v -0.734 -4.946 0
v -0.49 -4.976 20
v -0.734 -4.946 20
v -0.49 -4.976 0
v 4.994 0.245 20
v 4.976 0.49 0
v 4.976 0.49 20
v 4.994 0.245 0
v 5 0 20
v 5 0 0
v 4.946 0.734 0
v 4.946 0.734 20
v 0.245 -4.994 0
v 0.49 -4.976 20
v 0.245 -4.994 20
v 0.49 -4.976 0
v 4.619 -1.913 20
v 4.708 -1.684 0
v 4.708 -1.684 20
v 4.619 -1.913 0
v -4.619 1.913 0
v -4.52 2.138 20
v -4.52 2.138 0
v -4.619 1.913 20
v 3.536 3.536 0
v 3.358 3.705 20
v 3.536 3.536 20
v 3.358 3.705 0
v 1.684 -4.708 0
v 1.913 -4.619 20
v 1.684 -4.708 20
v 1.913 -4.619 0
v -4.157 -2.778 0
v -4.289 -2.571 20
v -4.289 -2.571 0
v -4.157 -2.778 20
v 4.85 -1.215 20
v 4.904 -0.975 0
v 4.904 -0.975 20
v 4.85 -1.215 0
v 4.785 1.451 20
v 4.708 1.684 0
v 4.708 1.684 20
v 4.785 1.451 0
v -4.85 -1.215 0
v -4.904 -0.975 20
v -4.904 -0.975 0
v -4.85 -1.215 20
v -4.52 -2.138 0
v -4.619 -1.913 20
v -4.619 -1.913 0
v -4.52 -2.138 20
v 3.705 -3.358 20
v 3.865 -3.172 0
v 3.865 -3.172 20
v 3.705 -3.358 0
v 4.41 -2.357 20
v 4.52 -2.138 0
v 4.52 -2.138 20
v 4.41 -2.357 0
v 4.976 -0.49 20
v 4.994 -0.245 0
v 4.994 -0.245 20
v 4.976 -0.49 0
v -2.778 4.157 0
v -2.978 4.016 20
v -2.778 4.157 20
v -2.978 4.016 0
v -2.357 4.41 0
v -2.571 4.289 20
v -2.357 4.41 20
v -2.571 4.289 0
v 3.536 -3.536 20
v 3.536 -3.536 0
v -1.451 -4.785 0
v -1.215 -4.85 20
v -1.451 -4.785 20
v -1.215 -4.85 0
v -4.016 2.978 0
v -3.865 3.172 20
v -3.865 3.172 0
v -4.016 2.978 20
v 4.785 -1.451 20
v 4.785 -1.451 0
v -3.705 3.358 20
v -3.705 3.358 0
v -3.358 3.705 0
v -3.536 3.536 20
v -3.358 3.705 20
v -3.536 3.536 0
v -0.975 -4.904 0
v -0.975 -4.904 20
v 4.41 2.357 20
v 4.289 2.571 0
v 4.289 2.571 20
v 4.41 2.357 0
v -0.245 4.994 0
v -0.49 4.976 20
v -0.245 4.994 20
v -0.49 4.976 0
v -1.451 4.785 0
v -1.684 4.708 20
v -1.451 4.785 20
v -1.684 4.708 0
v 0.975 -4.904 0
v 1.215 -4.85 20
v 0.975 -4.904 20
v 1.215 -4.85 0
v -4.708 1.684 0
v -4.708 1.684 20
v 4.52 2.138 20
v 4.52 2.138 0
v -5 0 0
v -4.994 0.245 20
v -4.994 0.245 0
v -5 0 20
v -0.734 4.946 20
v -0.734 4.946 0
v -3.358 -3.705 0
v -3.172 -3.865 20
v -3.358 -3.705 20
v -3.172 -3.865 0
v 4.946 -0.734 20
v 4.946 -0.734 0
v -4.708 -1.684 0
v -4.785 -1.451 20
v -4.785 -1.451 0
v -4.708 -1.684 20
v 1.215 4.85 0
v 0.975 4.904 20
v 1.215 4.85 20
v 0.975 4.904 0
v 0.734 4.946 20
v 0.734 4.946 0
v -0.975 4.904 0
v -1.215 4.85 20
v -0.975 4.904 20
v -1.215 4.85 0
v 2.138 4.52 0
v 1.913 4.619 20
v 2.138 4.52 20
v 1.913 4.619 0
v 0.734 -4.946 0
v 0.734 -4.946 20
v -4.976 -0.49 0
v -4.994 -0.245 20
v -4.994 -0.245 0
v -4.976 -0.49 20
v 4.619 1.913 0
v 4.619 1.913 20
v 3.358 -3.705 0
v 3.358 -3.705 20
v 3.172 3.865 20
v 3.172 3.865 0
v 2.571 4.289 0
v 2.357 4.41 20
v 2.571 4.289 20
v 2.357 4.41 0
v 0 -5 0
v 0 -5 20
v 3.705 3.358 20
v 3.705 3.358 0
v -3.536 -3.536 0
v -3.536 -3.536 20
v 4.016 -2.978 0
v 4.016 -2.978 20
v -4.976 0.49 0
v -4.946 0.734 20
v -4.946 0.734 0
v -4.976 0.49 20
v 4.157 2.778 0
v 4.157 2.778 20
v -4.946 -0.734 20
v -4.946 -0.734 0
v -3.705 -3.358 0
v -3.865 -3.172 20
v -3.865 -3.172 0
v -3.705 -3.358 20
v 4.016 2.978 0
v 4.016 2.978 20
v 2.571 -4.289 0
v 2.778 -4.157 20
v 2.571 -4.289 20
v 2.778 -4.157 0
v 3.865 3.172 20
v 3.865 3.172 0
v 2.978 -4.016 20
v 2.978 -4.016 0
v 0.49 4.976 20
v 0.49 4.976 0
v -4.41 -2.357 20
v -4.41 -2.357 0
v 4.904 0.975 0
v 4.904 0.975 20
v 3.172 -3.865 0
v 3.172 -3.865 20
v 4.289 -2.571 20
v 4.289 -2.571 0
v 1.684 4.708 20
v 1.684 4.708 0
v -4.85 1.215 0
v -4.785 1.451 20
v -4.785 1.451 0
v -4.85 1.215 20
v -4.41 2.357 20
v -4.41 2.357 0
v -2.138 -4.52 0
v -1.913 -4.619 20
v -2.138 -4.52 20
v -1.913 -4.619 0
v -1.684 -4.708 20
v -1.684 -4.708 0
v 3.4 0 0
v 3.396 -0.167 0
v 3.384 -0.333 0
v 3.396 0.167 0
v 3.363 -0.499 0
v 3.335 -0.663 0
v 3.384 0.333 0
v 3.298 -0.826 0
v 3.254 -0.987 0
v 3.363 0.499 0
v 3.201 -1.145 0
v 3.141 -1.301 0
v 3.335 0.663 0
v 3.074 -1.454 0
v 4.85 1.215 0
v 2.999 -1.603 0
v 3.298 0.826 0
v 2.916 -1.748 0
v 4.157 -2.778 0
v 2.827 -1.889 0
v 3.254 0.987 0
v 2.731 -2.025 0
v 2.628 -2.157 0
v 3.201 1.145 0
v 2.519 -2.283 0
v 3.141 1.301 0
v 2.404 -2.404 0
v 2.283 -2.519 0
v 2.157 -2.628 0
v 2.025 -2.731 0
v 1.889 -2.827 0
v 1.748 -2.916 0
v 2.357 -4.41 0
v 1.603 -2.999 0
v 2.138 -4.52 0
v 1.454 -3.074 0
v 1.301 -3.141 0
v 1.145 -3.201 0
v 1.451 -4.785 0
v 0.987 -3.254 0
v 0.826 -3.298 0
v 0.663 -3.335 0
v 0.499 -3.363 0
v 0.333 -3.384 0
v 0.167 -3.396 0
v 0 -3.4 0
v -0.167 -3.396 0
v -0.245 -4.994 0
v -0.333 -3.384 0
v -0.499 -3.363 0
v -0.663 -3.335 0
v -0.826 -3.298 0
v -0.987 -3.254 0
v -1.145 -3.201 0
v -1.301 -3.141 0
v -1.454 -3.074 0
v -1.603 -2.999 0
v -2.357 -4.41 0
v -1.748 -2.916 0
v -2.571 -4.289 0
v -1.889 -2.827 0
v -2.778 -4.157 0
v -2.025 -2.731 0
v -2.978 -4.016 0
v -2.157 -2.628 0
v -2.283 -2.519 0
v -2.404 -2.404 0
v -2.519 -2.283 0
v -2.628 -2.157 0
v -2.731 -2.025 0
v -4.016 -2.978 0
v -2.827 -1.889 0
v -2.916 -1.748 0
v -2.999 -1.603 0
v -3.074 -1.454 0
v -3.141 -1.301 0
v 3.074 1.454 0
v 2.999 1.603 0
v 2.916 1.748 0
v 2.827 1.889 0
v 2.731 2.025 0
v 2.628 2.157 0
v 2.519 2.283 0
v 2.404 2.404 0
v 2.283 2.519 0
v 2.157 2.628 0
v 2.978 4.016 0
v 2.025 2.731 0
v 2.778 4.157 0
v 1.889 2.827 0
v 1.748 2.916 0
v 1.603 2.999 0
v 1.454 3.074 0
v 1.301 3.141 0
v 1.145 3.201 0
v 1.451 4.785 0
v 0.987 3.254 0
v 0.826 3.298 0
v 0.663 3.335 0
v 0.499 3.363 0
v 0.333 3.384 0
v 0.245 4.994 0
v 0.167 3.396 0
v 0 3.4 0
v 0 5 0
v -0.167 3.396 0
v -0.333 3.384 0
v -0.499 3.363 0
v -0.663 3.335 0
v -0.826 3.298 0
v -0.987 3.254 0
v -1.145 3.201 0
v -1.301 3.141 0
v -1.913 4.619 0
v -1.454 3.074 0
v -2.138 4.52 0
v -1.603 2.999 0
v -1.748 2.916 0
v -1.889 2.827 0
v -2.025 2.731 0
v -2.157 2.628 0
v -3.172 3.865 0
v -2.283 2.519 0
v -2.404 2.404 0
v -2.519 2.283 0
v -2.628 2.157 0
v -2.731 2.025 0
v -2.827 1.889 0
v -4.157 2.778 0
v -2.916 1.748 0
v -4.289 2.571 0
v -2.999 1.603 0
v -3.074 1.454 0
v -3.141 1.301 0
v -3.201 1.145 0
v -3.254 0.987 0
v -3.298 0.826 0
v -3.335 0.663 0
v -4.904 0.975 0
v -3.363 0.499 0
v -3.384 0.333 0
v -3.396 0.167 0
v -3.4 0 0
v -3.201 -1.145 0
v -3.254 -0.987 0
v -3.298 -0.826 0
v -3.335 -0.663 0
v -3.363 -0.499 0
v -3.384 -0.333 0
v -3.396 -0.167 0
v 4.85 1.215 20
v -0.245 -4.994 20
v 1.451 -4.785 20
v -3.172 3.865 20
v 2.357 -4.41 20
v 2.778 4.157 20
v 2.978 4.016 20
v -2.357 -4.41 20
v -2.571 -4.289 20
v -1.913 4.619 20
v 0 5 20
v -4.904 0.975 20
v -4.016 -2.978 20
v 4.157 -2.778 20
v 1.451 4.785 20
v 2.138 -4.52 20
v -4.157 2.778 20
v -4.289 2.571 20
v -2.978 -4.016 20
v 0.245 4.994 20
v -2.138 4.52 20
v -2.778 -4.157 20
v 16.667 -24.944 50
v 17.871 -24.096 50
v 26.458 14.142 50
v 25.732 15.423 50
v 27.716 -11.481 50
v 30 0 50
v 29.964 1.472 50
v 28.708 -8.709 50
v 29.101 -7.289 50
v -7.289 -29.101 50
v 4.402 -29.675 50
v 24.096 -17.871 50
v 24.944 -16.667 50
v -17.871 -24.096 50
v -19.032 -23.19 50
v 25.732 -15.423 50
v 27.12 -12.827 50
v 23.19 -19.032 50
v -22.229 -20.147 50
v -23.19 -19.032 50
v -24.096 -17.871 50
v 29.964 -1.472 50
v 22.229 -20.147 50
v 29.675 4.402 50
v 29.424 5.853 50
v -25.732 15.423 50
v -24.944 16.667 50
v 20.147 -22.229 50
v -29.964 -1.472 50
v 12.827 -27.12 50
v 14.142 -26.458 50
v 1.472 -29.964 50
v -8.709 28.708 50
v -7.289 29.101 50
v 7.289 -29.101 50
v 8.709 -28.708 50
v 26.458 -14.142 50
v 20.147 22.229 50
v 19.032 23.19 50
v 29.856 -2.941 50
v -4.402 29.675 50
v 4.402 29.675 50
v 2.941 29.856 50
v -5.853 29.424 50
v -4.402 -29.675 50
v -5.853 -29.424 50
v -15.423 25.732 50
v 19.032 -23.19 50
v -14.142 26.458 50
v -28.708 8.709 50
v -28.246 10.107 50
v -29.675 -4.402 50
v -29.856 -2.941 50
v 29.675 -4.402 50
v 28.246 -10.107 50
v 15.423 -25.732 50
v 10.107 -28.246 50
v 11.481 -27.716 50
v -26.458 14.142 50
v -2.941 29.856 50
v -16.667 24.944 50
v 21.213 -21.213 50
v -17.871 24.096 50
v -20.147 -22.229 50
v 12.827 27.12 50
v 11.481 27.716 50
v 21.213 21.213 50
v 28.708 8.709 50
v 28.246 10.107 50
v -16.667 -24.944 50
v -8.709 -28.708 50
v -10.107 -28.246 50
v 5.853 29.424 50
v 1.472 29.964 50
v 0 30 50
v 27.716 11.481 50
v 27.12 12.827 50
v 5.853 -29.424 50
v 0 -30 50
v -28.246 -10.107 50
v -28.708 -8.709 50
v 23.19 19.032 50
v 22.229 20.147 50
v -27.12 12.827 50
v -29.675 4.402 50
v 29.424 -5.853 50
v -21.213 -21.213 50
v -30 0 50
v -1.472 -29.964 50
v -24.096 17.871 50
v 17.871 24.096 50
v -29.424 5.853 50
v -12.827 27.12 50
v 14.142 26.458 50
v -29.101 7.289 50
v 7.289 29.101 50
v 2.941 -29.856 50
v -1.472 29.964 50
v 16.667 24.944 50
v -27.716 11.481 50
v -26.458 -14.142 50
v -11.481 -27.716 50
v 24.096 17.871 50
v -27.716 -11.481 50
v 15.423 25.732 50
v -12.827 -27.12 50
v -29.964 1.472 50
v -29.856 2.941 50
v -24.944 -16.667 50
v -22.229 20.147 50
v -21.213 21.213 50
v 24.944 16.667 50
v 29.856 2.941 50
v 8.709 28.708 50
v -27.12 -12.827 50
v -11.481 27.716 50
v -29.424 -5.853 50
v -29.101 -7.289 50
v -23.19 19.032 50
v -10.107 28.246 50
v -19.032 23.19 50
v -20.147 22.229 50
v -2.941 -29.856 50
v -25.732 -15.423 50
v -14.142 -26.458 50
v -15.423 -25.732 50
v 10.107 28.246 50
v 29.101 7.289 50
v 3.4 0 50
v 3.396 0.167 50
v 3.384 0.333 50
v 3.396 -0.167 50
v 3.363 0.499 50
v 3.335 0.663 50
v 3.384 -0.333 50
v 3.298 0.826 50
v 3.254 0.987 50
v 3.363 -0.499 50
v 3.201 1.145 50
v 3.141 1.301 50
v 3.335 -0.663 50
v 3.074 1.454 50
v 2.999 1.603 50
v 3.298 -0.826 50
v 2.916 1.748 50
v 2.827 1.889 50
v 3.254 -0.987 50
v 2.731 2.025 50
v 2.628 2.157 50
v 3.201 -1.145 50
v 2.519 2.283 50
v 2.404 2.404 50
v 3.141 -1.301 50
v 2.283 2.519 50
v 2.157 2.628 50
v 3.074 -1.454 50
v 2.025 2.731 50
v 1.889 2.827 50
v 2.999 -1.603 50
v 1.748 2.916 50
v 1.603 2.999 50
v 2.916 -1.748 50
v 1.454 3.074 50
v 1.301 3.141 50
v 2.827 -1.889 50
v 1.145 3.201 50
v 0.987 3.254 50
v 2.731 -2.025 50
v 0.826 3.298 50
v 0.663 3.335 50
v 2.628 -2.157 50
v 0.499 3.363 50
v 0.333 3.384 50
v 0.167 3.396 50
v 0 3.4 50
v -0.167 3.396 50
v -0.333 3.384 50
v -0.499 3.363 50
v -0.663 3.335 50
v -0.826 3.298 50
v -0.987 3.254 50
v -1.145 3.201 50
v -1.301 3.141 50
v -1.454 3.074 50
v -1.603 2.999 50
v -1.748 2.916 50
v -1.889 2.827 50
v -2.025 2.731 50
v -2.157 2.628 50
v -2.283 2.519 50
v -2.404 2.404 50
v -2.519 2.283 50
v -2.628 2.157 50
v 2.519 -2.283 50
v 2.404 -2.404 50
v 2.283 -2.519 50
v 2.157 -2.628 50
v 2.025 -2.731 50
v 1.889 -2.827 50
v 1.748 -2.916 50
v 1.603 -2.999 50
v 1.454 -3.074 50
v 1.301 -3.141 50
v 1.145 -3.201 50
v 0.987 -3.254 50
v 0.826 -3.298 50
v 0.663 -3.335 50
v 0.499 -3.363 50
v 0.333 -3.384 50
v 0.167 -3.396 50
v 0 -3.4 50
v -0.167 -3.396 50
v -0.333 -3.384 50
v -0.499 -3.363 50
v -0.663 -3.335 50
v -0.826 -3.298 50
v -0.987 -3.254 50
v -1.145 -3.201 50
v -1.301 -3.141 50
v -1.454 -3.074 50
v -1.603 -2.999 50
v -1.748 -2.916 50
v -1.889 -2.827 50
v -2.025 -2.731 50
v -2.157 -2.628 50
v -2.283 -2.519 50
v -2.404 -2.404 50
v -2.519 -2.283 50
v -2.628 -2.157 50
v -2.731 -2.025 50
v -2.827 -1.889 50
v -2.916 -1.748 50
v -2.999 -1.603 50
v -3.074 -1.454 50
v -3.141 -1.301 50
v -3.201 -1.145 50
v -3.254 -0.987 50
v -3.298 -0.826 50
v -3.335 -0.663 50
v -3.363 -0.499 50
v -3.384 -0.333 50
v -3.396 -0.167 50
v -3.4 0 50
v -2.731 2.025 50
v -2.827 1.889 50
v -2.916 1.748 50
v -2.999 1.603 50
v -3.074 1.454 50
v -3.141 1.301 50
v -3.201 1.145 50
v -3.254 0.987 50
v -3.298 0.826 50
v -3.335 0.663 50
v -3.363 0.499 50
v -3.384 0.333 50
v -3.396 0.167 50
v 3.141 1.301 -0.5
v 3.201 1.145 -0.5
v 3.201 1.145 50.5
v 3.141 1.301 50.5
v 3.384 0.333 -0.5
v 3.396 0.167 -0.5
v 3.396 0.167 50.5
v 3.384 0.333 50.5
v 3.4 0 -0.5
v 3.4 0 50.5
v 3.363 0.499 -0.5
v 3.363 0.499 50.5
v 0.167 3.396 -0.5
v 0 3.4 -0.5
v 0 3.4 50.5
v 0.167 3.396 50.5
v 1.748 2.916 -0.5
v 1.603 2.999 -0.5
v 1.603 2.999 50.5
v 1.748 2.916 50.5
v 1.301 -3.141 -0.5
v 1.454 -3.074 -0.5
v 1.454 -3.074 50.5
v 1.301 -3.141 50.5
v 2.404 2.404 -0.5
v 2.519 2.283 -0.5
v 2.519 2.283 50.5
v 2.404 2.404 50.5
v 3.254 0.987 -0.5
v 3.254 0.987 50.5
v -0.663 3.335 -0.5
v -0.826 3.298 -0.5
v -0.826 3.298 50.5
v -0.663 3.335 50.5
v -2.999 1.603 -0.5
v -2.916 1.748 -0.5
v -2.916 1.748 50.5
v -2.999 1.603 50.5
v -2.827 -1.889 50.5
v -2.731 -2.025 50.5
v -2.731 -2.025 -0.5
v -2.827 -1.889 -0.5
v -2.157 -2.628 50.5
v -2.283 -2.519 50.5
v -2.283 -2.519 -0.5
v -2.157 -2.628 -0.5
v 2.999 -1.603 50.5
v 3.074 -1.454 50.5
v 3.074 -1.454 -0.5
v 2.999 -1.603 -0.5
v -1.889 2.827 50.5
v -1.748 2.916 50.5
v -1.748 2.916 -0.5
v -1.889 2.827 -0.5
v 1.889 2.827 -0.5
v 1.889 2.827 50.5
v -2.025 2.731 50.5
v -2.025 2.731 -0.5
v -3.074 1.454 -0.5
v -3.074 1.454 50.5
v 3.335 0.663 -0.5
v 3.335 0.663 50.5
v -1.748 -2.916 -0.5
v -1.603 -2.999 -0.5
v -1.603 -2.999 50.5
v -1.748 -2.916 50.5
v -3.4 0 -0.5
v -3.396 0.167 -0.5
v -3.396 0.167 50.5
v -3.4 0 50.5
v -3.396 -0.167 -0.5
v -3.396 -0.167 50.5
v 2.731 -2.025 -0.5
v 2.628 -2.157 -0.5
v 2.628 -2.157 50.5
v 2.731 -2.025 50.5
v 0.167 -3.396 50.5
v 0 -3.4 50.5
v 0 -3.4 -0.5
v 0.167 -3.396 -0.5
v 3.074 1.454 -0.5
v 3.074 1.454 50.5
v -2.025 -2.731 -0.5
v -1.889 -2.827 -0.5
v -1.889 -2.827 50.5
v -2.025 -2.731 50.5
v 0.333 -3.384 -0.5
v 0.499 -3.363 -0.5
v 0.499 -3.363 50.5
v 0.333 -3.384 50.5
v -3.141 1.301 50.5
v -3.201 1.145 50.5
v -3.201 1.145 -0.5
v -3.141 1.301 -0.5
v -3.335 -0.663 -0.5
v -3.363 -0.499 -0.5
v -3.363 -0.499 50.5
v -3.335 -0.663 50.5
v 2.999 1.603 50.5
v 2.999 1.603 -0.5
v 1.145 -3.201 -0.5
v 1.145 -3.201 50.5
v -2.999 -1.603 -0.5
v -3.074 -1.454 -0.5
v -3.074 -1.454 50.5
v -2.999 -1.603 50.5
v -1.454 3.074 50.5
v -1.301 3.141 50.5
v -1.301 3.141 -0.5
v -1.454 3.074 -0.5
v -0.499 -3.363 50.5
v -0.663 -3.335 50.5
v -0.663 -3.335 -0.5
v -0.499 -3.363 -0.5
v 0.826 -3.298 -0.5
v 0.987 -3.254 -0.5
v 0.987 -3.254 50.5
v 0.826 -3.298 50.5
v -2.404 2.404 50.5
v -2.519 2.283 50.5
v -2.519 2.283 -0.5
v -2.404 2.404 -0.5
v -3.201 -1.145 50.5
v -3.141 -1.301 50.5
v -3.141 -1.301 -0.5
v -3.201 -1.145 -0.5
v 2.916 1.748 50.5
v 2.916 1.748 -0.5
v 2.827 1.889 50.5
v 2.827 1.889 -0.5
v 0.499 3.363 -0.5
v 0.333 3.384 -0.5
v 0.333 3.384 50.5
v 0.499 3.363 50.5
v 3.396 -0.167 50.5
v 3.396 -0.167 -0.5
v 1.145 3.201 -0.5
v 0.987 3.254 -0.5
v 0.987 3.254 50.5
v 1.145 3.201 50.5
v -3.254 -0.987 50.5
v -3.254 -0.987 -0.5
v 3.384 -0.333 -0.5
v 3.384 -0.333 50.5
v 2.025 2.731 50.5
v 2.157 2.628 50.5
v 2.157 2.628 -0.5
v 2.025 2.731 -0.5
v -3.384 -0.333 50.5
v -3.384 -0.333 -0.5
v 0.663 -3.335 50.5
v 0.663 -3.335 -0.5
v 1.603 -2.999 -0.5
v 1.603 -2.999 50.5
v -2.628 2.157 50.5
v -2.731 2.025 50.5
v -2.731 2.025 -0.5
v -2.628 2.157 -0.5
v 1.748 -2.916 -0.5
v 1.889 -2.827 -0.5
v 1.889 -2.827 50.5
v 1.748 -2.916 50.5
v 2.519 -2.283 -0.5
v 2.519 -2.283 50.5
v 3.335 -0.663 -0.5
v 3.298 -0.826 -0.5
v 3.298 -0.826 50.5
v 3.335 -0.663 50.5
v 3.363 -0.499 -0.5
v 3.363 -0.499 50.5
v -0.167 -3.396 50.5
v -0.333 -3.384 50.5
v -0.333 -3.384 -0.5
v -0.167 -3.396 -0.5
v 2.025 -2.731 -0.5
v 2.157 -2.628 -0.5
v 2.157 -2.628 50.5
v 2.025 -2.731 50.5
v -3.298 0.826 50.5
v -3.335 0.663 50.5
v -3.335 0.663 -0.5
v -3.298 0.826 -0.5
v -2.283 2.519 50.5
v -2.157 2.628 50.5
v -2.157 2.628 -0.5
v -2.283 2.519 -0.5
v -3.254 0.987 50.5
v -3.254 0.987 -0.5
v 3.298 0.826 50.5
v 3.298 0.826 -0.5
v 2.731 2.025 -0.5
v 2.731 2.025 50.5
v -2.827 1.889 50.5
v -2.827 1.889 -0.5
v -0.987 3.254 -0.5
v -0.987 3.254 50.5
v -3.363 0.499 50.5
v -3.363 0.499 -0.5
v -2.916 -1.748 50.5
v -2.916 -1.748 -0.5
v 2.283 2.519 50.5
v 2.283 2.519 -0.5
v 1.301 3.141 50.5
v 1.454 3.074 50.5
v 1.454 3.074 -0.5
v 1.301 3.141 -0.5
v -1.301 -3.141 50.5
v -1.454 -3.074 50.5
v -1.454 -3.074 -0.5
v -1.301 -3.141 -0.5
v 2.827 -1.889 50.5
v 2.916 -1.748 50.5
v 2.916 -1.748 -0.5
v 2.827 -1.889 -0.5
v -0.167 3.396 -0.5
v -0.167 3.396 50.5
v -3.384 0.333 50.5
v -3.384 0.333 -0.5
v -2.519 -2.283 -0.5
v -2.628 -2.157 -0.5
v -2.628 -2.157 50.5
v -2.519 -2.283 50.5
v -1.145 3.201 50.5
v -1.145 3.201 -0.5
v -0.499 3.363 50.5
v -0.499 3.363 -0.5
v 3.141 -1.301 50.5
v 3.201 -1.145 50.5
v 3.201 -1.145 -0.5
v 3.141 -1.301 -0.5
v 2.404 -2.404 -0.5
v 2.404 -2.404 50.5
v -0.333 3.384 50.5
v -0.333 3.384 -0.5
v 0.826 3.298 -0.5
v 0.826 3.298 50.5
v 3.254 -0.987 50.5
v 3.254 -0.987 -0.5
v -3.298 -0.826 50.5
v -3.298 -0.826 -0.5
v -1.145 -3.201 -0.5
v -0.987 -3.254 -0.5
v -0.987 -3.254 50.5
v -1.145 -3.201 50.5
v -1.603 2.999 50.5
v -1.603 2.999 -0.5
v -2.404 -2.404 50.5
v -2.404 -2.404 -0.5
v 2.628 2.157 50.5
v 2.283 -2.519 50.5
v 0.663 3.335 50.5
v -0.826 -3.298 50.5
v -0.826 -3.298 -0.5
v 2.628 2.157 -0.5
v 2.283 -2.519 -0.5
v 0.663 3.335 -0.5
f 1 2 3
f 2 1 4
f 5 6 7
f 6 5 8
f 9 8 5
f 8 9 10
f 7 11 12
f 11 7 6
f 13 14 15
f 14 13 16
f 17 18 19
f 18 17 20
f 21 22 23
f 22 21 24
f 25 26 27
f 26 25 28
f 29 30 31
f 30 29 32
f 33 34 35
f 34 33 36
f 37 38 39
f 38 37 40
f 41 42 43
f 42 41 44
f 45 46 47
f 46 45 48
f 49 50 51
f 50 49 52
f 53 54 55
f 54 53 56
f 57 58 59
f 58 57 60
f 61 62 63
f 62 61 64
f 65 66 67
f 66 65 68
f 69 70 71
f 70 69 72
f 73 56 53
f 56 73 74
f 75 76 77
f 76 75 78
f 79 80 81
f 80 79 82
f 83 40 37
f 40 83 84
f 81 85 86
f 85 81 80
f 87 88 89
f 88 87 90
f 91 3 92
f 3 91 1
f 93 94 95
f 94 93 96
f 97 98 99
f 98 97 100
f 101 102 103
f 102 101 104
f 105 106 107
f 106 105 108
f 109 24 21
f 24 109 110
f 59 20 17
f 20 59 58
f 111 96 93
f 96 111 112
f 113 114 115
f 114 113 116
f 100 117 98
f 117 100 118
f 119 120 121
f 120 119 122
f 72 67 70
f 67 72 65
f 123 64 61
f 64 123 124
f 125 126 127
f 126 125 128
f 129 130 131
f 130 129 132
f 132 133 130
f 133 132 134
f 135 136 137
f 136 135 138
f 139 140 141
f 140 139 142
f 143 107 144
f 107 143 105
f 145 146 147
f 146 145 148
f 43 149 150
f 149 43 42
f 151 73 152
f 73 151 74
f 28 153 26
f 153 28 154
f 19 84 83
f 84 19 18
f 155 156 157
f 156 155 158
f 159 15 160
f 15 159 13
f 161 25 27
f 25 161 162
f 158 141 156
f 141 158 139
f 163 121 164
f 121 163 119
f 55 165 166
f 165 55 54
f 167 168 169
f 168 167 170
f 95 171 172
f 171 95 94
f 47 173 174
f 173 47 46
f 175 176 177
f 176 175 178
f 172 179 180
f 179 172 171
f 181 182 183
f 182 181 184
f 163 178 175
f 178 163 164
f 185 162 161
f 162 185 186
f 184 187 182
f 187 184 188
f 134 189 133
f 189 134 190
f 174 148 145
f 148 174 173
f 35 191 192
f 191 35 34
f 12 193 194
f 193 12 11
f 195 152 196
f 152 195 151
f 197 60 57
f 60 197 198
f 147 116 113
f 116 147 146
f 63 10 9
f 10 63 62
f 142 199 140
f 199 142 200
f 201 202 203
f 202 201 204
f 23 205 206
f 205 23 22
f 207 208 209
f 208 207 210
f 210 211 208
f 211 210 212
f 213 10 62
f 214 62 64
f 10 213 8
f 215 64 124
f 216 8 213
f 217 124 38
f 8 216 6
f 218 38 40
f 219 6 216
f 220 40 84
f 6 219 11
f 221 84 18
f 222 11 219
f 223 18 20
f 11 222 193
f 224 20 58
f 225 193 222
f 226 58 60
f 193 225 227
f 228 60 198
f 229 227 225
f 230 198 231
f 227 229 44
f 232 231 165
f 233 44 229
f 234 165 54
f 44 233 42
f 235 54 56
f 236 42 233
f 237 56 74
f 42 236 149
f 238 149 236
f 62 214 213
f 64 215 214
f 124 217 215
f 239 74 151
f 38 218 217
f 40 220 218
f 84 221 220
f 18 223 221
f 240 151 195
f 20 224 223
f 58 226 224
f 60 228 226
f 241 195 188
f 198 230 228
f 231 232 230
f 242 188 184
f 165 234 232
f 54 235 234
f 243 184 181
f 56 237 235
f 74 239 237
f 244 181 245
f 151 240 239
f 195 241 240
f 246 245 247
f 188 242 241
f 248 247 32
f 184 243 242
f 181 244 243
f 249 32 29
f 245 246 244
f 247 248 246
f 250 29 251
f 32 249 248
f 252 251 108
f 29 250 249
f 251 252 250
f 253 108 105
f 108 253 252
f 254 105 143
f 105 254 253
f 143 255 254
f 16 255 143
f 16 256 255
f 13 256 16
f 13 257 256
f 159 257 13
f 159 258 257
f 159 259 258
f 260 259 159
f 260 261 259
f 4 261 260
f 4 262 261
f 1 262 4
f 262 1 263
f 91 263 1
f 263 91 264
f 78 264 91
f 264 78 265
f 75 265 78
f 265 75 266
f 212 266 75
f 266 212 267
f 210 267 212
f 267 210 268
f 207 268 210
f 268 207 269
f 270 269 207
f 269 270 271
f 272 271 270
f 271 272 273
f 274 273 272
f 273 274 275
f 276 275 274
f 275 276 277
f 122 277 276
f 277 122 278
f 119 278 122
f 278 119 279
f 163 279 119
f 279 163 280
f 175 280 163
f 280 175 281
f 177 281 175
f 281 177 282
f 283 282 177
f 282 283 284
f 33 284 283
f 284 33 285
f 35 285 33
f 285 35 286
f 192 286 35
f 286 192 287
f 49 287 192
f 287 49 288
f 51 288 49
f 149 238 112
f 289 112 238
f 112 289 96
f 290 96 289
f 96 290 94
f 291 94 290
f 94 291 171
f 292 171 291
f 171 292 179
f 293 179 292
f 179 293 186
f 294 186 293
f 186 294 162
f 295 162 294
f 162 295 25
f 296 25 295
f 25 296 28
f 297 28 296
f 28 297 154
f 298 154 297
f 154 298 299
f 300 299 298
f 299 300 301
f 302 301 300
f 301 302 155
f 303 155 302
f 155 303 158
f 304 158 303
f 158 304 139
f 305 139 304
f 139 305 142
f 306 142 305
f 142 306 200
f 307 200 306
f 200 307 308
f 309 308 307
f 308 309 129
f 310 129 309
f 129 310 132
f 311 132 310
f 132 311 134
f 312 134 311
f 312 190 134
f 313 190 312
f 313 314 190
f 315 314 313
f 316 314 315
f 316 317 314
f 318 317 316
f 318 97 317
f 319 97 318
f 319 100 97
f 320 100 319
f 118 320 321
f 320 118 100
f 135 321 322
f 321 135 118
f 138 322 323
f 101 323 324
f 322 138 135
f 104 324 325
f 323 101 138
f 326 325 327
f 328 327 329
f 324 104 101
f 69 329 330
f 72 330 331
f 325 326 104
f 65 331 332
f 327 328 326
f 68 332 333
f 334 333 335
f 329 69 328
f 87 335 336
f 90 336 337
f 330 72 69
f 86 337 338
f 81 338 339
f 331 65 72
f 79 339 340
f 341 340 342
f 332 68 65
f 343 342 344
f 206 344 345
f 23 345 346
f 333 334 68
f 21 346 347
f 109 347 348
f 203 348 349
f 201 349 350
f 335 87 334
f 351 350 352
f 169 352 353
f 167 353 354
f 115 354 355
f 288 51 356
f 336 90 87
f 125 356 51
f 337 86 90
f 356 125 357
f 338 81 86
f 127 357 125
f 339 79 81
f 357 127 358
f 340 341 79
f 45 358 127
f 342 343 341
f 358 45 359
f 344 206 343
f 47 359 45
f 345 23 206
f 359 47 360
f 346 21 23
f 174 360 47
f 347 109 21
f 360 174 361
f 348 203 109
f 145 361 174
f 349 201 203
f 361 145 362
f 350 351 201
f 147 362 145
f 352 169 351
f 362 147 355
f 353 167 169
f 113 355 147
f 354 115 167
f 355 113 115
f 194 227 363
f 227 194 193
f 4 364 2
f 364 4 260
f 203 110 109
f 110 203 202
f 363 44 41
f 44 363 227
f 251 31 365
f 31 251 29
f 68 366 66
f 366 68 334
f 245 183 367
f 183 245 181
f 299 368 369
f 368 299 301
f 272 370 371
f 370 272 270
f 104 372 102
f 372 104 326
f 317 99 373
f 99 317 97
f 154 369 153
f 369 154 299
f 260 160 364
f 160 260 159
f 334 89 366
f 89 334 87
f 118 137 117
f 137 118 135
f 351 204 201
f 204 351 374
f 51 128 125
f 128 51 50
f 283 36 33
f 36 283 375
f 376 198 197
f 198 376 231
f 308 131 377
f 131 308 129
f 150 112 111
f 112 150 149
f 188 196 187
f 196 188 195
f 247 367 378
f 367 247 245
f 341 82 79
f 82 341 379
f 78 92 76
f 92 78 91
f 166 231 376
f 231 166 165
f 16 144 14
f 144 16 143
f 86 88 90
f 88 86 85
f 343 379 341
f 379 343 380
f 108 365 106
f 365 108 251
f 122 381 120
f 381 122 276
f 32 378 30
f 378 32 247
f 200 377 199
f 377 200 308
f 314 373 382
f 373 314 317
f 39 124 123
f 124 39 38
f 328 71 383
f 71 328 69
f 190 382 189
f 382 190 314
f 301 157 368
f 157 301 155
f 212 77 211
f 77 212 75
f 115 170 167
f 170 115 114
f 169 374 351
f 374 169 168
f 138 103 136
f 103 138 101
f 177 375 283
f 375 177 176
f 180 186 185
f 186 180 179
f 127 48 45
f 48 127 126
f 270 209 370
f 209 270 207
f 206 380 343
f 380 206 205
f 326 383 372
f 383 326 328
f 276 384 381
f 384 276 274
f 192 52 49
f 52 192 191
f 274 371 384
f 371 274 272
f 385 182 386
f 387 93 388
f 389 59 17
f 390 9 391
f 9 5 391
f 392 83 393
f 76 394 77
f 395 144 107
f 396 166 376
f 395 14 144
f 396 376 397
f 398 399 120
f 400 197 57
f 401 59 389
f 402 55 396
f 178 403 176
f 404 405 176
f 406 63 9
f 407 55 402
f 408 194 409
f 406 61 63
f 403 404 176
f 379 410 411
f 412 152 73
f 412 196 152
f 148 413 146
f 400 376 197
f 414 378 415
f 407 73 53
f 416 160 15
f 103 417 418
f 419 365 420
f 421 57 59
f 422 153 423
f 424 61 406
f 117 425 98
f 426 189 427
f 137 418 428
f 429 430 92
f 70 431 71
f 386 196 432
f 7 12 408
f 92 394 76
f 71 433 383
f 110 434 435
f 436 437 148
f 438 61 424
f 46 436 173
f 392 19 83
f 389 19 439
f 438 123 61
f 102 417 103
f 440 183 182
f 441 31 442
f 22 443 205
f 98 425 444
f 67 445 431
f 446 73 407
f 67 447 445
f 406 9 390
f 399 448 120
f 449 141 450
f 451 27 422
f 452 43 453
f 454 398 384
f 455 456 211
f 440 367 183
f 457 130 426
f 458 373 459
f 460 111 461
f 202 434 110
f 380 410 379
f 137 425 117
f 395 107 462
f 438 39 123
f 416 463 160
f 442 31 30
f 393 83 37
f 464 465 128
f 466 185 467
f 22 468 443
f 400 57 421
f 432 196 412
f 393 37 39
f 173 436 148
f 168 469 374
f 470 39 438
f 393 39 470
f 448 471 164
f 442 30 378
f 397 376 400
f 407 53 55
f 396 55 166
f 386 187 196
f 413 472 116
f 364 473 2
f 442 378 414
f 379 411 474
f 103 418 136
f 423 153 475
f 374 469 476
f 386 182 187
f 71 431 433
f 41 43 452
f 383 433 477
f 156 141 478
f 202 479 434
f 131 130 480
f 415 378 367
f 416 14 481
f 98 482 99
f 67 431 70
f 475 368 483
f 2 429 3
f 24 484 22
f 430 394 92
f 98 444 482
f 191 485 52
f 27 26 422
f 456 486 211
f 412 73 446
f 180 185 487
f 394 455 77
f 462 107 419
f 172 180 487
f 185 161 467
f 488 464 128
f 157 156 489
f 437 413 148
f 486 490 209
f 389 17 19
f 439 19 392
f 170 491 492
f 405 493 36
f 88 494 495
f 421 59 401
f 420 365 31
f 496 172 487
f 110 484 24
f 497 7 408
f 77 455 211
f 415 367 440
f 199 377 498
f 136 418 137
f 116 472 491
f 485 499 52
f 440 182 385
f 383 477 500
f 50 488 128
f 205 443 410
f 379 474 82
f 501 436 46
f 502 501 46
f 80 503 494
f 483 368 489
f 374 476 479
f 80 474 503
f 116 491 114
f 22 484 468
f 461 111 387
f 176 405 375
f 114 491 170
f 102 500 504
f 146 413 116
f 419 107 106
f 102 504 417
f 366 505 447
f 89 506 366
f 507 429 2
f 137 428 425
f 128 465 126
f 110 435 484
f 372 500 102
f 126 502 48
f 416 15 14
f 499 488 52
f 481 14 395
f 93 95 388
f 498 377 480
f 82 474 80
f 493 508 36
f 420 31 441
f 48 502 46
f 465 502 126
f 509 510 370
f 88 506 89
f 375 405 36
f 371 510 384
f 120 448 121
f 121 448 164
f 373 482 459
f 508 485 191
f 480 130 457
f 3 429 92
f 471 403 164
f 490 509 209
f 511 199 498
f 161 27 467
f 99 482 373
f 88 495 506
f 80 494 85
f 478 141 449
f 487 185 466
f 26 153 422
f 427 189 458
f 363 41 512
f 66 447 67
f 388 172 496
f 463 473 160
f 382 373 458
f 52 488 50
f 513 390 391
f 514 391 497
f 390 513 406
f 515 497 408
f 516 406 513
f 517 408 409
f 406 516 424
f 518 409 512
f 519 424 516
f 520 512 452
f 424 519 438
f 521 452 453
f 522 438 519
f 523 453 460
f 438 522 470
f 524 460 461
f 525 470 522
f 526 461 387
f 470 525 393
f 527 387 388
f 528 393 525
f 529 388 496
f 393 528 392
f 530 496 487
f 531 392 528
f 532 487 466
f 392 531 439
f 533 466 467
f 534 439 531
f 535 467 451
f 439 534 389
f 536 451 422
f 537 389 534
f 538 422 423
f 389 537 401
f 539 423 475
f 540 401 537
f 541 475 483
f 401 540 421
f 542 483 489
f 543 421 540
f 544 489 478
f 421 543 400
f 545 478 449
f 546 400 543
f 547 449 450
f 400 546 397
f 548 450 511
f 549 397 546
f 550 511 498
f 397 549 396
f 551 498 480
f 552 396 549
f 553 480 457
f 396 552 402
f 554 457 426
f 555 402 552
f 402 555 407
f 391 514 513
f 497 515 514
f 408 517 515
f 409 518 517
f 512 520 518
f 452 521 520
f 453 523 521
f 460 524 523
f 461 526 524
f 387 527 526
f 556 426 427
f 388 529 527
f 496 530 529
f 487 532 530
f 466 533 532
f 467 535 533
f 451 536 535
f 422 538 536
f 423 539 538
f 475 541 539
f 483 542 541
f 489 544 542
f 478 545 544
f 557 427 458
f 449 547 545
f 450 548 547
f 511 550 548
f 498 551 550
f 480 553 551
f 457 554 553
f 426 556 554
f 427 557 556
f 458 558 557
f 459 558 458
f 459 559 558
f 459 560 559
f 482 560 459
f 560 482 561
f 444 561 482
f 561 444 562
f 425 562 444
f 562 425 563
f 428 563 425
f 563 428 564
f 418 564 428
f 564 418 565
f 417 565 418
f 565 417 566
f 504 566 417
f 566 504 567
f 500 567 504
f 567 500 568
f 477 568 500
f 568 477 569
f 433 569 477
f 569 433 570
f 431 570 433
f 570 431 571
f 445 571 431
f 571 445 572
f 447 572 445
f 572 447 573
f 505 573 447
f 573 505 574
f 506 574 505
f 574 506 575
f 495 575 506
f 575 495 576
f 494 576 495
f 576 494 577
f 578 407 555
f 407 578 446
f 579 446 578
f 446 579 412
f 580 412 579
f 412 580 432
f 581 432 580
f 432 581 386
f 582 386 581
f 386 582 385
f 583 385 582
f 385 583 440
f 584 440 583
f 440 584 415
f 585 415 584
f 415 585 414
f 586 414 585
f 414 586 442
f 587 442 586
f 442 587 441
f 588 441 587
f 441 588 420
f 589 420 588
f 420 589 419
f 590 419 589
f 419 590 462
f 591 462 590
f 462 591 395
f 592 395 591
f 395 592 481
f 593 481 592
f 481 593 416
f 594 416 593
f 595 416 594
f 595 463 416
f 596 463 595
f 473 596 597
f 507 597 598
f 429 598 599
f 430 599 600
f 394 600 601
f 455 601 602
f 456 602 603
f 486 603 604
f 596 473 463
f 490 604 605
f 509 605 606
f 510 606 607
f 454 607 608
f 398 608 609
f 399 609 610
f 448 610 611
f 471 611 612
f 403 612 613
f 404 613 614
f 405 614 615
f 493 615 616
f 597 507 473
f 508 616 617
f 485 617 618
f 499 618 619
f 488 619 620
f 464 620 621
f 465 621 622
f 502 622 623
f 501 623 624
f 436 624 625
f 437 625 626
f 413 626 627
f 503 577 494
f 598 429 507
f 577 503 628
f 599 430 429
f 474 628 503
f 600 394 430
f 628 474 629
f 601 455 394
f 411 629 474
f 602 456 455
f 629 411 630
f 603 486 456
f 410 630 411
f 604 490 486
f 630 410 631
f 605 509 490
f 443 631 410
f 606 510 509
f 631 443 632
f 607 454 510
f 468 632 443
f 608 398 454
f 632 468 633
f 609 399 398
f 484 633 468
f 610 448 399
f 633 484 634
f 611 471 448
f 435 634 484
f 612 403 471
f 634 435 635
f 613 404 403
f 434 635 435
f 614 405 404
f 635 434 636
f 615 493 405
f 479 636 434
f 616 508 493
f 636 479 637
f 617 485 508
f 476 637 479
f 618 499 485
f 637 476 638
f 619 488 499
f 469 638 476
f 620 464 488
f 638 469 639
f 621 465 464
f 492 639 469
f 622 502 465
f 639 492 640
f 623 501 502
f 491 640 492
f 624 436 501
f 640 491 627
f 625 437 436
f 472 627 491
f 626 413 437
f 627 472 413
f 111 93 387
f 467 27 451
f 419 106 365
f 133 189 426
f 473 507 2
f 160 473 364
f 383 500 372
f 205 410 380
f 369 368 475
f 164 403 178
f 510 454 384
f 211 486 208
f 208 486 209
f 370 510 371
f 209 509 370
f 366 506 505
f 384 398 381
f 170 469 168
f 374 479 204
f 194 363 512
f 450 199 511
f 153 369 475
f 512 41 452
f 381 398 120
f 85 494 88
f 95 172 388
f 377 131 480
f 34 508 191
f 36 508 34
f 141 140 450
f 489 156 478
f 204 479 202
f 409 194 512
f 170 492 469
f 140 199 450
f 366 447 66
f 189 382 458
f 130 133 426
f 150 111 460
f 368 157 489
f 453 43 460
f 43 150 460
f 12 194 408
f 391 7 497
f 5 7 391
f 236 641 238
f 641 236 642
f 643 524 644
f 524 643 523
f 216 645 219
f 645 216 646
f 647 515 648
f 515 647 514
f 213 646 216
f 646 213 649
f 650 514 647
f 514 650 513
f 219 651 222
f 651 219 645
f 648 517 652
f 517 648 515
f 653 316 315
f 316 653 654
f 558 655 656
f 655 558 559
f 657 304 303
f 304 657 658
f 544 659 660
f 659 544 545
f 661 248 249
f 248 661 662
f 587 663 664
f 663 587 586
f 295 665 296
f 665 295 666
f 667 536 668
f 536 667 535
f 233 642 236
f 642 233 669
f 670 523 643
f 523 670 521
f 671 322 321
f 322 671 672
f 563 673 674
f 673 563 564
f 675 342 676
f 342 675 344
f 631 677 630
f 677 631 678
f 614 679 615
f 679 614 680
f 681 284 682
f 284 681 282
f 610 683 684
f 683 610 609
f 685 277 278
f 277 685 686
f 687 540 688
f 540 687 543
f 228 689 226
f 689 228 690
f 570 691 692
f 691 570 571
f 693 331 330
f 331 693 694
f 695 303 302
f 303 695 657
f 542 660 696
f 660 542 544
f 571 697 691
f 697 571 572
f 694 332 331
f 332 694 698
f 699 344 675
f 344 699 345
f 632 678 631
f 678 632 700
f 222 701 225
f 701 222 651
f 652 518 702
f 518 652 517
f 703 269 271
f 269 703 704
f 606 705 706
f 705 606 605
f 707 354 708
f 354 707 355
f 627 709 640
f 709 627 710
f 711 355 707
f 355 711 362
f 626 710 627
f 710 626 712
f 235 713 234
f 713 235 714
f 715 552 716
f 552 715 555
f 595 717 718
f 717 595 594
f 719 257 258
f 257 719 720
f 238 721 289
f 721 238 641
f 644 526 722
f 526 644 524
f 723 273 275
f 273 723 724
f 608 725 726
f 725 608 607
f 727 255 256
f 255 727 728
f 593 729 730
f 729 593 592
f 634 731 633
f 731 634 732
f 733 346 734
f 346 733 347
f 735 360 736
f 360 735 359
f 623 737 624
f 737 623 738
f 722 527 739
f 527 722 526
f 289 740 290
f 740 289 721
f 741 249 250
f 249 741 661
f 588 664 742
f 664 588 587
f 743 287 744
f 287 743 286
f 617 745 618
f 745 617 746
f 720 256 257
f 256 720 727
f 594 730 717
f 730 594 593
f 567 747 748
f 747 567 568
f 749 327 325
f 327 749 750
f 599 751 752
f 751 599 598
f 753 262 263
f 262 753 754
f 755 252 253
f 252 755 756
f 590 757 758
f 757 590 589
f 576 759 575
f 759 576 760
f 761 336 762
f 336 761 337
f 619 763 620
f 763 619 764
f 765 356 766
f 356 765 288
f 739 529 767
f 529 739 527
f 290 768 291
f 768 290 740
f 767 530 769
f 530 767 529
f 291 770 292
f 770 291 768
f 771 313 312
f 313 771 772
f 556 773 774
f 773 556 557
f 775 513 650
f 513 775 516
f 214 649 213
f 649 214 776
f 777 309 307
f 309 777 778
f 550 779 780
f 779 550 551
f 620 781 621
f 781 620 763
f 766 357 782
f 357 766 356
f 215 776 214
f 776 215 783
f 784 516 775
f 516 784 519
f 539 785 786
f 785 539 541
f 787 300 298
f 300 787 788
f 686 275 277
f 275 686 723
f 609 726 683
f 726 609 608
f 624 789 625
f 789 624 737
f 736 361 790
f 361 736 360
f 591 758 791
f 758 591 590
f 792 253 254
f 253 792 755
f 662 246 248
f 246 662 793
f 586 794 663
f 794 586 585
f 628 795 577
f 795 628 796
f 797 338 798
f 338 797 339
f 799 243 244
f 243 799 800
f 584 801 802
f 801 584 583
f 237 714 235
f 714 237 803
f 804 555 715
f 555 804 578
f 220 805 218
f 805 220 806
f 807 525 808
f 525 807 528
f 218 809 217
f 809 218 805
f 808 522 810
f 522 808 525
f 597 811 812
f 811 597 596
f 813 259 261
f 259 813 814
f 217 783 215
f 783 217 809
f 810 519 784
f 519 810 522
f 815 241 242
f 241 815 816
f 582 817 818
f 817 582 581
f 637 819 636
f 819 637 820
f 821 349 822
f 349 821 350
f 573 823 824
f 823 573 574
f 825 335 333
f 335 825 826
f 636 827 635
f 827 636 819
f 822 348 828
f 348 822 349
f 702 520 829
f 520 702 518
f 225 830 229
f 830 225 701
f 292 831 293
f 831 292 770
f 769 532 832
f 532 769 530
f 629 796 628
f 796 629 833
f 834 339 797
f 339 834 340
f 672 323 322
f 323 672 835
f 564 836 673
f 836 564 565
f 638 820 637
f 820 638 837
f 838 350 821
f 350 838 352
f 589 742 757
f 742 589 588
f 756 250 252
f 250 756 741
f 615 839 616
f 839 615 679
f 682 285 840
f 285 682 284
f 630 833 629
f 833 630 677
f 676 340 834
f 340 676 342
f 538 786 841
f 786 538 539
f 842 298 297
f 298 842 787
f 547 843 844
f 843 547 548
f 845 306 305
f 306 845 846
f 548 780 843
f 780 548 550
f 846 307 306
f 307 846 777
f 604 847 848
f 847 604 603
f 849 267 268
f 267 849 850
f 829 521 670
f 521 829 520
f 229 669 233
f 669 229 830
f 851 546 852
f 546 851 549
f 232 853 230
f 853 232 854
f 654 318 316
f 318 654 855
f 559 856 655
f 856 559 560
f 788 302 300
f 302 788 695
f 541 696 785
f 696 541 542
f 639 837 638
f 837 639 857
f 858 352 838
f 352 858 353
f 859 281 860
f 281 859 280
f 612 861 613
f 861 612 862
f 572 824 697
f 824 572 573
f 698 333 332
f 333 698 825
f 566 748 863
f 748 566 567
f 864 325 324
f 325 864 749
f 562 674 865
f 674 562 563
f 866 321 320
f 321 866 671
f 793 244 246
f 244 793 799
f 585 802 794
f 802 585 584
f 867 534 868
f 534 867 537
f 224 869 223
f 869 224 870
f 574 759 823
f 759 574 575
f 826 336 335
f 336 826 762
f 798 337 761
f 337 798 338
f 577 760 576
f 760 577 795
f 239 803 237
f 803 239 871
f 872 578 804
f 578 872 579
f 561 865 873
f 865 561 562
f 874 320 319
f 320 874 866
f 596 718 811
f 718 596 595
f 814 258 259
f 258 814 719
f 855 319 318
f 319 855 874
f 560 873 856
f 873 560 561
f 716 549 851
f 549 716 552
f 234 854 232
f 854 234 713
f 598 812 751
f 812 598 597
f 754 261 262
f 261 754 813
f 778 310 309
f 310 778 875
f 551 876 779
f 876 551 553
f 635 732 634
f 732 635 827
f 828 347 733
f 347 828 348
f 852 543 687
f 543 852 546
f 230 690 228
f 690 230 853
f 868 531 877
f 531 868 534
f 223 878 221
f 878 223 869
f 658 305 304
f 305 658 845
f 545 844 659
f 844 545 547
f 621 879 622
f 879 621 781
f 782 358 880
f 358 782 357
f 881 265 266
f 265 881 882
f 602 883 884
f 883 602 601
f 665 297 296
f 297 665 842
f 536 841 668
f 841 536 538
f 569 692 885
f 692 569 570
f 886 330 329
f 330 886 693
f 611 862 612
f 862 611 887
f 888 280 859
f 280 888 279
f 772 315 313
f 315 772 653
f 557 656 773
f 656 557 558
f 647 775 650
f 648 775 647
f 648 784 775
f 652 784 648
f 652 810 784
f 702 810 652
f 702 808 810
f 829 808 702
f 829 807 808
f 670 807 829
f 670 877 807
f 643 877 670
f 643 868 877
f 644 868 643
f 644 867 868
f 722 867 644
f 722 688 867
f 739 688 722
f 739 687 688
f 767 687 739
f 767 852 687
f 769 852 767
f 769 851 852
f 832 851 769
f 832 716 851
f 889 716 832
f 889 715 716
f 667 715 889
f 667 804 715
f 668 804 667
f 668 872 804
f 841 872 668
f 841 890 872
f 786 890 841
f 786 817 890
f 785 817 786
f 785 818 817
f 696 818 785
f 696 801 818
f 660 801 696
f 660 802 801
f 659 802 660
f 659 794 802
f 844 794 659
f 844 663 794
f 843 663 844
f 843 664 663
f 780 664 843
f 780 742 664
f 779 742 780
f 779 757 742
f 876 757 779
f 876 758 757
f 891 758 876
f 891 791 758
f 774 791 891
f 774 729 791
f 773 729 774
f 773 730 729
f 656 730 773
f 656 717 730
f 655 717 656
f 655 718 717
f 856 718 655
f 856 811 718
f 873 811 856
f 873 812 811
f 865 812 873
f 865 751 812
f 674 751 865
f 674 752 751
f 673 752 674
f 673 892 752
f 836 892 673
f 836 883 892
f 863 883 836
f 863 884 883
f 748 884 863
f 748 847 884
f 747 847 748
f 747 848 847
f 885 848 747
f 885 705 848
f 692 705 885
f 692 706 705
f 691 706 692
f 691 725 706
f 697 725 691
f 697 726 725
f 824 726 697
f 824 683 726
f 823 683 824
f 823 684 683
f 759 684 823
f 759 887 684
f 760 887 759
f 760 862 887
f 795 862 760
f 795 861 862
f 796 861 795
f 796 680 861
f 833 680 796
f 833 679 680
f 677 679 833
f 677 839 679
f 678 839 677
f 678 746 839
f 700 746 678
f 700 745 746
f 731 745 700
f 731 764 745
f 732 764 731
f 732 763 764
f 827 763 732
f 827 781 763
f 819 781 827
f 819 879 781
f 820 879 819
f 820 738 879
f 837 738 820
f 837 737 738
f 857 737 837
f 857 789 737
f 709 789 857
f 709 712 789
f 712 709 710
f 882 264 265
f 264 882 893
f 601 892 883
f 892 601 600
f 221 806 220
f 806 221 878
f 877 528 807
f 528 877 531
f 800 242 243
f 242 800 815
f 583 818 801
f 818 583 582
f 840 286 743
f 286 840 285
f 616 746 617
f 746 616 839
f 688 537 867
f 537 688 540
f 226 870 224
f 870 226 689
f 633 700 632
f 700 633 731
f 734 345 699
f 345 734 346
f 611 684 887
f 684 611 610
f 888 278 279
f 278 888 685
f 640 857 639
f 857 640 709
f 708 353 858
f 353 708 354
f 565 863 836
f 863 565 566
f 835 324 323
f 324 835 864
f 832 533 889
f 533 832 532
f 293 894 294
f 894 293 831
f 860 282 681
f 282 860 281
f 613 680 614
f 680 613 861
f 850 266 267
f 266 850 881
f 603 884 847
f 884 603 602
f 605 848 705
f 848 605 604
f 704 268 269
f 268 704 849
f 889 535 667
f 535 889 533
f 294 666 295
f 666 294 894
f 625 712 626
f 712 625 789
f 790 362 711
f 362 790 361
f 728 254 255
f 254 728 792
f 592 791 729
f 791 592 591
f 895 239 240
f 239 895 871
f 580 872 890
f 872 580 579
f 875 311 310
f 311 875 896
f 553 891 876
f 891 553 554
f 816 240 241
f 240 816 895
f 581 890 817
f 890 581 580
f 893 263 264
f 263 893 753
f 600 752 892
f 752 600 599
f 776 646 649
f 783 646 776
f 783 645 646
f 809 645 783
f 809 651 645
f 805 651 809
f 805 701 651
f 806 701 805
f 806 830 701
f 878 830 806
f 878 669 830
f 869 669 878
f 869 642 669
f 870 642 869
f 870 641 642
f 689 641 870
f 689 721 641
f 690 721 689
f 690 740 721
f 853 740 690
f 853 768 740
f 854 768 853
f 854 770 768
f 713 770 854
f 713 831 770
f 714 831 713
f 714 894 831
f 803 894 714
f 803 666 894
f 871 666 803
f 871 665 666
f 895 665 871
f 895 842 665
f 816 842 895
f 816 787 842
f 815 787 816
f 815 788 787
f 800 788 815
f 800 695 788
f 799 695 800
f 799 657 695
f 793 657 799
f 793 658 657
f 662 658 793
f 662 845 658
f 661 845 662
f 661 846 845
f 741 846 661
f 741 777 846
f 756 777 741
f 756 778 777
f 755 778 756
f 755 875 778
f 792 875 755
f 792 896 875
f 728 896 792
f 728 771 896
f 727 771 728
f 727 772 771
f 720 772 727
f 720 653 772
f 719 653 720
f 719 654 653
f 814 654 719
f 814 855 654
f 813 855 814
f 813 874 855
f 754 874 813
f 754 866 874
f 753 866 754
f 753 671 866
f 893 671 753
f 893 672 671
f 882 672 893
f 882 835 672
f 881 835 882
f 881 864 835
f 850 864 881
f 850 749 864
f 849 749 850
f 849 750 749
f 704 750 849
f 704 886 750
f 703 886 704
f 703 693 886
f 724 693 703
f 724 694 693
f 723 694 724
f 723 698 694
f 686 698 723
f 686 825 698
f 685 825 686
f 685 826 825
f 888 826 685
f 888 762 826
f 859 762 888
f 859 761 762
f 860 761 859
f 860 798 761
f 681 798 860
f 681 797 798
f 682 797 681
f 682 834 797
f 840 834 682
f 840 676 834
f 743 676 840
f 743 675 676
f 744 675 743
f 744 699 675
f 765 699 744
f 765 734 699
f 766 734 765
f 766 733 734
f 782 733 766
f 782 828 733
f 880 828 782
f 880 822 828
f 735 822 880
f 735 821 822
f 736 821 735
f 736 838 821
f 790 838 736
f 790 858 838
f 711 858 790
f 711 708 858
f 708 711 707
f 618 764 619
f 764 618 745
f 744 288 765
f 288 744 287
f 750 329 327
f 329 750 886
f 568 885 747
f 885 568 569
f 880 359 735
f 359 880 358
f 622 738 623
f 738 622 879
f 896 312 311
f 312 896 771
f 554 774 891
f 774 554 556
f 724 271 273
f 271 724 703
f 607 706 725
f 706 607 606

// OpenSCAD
// Lab funnel - printed upright, open at top and bottom
// Units: mm

// ---- Parameters ----
spout_od      = 10;    // spout outer diameter
spout_h       = 20;    // spout height (z = 0 to 20)
cone_od_top   = 60;    // cone rim outer diameter (z = 50)
cone_h        = 30;    // cone height (z = 20 to 50)
wall          = 1.6;   // wall thickness everywhere
eps           = 0.5;   // cutter overshoot past faces

$fn = 128;

// ---- Derived ----
spout_id = spout_od - 2 * wall;   // bore diameter
cone_id_top = cone_od_top - 2 * wall; // rim bore diameter

// ---- Model ----
union() {
    // Spout (tube)
    translate([0, 0, 0])
        cylinder(d = spout_od, h = spout_h);

    // Cone (widens from spout top to rim)
    translate([0, 0, spout_h])
        cylinder(d1 = spout_od, d2 = cone_od_top, h = cone_h);
}

// Cut through the axis so liquid runs straight through
translate([0, 0, -eps])
    cylinder(d = spout_id, h = spout_h + cone_h + 2 * eps);
